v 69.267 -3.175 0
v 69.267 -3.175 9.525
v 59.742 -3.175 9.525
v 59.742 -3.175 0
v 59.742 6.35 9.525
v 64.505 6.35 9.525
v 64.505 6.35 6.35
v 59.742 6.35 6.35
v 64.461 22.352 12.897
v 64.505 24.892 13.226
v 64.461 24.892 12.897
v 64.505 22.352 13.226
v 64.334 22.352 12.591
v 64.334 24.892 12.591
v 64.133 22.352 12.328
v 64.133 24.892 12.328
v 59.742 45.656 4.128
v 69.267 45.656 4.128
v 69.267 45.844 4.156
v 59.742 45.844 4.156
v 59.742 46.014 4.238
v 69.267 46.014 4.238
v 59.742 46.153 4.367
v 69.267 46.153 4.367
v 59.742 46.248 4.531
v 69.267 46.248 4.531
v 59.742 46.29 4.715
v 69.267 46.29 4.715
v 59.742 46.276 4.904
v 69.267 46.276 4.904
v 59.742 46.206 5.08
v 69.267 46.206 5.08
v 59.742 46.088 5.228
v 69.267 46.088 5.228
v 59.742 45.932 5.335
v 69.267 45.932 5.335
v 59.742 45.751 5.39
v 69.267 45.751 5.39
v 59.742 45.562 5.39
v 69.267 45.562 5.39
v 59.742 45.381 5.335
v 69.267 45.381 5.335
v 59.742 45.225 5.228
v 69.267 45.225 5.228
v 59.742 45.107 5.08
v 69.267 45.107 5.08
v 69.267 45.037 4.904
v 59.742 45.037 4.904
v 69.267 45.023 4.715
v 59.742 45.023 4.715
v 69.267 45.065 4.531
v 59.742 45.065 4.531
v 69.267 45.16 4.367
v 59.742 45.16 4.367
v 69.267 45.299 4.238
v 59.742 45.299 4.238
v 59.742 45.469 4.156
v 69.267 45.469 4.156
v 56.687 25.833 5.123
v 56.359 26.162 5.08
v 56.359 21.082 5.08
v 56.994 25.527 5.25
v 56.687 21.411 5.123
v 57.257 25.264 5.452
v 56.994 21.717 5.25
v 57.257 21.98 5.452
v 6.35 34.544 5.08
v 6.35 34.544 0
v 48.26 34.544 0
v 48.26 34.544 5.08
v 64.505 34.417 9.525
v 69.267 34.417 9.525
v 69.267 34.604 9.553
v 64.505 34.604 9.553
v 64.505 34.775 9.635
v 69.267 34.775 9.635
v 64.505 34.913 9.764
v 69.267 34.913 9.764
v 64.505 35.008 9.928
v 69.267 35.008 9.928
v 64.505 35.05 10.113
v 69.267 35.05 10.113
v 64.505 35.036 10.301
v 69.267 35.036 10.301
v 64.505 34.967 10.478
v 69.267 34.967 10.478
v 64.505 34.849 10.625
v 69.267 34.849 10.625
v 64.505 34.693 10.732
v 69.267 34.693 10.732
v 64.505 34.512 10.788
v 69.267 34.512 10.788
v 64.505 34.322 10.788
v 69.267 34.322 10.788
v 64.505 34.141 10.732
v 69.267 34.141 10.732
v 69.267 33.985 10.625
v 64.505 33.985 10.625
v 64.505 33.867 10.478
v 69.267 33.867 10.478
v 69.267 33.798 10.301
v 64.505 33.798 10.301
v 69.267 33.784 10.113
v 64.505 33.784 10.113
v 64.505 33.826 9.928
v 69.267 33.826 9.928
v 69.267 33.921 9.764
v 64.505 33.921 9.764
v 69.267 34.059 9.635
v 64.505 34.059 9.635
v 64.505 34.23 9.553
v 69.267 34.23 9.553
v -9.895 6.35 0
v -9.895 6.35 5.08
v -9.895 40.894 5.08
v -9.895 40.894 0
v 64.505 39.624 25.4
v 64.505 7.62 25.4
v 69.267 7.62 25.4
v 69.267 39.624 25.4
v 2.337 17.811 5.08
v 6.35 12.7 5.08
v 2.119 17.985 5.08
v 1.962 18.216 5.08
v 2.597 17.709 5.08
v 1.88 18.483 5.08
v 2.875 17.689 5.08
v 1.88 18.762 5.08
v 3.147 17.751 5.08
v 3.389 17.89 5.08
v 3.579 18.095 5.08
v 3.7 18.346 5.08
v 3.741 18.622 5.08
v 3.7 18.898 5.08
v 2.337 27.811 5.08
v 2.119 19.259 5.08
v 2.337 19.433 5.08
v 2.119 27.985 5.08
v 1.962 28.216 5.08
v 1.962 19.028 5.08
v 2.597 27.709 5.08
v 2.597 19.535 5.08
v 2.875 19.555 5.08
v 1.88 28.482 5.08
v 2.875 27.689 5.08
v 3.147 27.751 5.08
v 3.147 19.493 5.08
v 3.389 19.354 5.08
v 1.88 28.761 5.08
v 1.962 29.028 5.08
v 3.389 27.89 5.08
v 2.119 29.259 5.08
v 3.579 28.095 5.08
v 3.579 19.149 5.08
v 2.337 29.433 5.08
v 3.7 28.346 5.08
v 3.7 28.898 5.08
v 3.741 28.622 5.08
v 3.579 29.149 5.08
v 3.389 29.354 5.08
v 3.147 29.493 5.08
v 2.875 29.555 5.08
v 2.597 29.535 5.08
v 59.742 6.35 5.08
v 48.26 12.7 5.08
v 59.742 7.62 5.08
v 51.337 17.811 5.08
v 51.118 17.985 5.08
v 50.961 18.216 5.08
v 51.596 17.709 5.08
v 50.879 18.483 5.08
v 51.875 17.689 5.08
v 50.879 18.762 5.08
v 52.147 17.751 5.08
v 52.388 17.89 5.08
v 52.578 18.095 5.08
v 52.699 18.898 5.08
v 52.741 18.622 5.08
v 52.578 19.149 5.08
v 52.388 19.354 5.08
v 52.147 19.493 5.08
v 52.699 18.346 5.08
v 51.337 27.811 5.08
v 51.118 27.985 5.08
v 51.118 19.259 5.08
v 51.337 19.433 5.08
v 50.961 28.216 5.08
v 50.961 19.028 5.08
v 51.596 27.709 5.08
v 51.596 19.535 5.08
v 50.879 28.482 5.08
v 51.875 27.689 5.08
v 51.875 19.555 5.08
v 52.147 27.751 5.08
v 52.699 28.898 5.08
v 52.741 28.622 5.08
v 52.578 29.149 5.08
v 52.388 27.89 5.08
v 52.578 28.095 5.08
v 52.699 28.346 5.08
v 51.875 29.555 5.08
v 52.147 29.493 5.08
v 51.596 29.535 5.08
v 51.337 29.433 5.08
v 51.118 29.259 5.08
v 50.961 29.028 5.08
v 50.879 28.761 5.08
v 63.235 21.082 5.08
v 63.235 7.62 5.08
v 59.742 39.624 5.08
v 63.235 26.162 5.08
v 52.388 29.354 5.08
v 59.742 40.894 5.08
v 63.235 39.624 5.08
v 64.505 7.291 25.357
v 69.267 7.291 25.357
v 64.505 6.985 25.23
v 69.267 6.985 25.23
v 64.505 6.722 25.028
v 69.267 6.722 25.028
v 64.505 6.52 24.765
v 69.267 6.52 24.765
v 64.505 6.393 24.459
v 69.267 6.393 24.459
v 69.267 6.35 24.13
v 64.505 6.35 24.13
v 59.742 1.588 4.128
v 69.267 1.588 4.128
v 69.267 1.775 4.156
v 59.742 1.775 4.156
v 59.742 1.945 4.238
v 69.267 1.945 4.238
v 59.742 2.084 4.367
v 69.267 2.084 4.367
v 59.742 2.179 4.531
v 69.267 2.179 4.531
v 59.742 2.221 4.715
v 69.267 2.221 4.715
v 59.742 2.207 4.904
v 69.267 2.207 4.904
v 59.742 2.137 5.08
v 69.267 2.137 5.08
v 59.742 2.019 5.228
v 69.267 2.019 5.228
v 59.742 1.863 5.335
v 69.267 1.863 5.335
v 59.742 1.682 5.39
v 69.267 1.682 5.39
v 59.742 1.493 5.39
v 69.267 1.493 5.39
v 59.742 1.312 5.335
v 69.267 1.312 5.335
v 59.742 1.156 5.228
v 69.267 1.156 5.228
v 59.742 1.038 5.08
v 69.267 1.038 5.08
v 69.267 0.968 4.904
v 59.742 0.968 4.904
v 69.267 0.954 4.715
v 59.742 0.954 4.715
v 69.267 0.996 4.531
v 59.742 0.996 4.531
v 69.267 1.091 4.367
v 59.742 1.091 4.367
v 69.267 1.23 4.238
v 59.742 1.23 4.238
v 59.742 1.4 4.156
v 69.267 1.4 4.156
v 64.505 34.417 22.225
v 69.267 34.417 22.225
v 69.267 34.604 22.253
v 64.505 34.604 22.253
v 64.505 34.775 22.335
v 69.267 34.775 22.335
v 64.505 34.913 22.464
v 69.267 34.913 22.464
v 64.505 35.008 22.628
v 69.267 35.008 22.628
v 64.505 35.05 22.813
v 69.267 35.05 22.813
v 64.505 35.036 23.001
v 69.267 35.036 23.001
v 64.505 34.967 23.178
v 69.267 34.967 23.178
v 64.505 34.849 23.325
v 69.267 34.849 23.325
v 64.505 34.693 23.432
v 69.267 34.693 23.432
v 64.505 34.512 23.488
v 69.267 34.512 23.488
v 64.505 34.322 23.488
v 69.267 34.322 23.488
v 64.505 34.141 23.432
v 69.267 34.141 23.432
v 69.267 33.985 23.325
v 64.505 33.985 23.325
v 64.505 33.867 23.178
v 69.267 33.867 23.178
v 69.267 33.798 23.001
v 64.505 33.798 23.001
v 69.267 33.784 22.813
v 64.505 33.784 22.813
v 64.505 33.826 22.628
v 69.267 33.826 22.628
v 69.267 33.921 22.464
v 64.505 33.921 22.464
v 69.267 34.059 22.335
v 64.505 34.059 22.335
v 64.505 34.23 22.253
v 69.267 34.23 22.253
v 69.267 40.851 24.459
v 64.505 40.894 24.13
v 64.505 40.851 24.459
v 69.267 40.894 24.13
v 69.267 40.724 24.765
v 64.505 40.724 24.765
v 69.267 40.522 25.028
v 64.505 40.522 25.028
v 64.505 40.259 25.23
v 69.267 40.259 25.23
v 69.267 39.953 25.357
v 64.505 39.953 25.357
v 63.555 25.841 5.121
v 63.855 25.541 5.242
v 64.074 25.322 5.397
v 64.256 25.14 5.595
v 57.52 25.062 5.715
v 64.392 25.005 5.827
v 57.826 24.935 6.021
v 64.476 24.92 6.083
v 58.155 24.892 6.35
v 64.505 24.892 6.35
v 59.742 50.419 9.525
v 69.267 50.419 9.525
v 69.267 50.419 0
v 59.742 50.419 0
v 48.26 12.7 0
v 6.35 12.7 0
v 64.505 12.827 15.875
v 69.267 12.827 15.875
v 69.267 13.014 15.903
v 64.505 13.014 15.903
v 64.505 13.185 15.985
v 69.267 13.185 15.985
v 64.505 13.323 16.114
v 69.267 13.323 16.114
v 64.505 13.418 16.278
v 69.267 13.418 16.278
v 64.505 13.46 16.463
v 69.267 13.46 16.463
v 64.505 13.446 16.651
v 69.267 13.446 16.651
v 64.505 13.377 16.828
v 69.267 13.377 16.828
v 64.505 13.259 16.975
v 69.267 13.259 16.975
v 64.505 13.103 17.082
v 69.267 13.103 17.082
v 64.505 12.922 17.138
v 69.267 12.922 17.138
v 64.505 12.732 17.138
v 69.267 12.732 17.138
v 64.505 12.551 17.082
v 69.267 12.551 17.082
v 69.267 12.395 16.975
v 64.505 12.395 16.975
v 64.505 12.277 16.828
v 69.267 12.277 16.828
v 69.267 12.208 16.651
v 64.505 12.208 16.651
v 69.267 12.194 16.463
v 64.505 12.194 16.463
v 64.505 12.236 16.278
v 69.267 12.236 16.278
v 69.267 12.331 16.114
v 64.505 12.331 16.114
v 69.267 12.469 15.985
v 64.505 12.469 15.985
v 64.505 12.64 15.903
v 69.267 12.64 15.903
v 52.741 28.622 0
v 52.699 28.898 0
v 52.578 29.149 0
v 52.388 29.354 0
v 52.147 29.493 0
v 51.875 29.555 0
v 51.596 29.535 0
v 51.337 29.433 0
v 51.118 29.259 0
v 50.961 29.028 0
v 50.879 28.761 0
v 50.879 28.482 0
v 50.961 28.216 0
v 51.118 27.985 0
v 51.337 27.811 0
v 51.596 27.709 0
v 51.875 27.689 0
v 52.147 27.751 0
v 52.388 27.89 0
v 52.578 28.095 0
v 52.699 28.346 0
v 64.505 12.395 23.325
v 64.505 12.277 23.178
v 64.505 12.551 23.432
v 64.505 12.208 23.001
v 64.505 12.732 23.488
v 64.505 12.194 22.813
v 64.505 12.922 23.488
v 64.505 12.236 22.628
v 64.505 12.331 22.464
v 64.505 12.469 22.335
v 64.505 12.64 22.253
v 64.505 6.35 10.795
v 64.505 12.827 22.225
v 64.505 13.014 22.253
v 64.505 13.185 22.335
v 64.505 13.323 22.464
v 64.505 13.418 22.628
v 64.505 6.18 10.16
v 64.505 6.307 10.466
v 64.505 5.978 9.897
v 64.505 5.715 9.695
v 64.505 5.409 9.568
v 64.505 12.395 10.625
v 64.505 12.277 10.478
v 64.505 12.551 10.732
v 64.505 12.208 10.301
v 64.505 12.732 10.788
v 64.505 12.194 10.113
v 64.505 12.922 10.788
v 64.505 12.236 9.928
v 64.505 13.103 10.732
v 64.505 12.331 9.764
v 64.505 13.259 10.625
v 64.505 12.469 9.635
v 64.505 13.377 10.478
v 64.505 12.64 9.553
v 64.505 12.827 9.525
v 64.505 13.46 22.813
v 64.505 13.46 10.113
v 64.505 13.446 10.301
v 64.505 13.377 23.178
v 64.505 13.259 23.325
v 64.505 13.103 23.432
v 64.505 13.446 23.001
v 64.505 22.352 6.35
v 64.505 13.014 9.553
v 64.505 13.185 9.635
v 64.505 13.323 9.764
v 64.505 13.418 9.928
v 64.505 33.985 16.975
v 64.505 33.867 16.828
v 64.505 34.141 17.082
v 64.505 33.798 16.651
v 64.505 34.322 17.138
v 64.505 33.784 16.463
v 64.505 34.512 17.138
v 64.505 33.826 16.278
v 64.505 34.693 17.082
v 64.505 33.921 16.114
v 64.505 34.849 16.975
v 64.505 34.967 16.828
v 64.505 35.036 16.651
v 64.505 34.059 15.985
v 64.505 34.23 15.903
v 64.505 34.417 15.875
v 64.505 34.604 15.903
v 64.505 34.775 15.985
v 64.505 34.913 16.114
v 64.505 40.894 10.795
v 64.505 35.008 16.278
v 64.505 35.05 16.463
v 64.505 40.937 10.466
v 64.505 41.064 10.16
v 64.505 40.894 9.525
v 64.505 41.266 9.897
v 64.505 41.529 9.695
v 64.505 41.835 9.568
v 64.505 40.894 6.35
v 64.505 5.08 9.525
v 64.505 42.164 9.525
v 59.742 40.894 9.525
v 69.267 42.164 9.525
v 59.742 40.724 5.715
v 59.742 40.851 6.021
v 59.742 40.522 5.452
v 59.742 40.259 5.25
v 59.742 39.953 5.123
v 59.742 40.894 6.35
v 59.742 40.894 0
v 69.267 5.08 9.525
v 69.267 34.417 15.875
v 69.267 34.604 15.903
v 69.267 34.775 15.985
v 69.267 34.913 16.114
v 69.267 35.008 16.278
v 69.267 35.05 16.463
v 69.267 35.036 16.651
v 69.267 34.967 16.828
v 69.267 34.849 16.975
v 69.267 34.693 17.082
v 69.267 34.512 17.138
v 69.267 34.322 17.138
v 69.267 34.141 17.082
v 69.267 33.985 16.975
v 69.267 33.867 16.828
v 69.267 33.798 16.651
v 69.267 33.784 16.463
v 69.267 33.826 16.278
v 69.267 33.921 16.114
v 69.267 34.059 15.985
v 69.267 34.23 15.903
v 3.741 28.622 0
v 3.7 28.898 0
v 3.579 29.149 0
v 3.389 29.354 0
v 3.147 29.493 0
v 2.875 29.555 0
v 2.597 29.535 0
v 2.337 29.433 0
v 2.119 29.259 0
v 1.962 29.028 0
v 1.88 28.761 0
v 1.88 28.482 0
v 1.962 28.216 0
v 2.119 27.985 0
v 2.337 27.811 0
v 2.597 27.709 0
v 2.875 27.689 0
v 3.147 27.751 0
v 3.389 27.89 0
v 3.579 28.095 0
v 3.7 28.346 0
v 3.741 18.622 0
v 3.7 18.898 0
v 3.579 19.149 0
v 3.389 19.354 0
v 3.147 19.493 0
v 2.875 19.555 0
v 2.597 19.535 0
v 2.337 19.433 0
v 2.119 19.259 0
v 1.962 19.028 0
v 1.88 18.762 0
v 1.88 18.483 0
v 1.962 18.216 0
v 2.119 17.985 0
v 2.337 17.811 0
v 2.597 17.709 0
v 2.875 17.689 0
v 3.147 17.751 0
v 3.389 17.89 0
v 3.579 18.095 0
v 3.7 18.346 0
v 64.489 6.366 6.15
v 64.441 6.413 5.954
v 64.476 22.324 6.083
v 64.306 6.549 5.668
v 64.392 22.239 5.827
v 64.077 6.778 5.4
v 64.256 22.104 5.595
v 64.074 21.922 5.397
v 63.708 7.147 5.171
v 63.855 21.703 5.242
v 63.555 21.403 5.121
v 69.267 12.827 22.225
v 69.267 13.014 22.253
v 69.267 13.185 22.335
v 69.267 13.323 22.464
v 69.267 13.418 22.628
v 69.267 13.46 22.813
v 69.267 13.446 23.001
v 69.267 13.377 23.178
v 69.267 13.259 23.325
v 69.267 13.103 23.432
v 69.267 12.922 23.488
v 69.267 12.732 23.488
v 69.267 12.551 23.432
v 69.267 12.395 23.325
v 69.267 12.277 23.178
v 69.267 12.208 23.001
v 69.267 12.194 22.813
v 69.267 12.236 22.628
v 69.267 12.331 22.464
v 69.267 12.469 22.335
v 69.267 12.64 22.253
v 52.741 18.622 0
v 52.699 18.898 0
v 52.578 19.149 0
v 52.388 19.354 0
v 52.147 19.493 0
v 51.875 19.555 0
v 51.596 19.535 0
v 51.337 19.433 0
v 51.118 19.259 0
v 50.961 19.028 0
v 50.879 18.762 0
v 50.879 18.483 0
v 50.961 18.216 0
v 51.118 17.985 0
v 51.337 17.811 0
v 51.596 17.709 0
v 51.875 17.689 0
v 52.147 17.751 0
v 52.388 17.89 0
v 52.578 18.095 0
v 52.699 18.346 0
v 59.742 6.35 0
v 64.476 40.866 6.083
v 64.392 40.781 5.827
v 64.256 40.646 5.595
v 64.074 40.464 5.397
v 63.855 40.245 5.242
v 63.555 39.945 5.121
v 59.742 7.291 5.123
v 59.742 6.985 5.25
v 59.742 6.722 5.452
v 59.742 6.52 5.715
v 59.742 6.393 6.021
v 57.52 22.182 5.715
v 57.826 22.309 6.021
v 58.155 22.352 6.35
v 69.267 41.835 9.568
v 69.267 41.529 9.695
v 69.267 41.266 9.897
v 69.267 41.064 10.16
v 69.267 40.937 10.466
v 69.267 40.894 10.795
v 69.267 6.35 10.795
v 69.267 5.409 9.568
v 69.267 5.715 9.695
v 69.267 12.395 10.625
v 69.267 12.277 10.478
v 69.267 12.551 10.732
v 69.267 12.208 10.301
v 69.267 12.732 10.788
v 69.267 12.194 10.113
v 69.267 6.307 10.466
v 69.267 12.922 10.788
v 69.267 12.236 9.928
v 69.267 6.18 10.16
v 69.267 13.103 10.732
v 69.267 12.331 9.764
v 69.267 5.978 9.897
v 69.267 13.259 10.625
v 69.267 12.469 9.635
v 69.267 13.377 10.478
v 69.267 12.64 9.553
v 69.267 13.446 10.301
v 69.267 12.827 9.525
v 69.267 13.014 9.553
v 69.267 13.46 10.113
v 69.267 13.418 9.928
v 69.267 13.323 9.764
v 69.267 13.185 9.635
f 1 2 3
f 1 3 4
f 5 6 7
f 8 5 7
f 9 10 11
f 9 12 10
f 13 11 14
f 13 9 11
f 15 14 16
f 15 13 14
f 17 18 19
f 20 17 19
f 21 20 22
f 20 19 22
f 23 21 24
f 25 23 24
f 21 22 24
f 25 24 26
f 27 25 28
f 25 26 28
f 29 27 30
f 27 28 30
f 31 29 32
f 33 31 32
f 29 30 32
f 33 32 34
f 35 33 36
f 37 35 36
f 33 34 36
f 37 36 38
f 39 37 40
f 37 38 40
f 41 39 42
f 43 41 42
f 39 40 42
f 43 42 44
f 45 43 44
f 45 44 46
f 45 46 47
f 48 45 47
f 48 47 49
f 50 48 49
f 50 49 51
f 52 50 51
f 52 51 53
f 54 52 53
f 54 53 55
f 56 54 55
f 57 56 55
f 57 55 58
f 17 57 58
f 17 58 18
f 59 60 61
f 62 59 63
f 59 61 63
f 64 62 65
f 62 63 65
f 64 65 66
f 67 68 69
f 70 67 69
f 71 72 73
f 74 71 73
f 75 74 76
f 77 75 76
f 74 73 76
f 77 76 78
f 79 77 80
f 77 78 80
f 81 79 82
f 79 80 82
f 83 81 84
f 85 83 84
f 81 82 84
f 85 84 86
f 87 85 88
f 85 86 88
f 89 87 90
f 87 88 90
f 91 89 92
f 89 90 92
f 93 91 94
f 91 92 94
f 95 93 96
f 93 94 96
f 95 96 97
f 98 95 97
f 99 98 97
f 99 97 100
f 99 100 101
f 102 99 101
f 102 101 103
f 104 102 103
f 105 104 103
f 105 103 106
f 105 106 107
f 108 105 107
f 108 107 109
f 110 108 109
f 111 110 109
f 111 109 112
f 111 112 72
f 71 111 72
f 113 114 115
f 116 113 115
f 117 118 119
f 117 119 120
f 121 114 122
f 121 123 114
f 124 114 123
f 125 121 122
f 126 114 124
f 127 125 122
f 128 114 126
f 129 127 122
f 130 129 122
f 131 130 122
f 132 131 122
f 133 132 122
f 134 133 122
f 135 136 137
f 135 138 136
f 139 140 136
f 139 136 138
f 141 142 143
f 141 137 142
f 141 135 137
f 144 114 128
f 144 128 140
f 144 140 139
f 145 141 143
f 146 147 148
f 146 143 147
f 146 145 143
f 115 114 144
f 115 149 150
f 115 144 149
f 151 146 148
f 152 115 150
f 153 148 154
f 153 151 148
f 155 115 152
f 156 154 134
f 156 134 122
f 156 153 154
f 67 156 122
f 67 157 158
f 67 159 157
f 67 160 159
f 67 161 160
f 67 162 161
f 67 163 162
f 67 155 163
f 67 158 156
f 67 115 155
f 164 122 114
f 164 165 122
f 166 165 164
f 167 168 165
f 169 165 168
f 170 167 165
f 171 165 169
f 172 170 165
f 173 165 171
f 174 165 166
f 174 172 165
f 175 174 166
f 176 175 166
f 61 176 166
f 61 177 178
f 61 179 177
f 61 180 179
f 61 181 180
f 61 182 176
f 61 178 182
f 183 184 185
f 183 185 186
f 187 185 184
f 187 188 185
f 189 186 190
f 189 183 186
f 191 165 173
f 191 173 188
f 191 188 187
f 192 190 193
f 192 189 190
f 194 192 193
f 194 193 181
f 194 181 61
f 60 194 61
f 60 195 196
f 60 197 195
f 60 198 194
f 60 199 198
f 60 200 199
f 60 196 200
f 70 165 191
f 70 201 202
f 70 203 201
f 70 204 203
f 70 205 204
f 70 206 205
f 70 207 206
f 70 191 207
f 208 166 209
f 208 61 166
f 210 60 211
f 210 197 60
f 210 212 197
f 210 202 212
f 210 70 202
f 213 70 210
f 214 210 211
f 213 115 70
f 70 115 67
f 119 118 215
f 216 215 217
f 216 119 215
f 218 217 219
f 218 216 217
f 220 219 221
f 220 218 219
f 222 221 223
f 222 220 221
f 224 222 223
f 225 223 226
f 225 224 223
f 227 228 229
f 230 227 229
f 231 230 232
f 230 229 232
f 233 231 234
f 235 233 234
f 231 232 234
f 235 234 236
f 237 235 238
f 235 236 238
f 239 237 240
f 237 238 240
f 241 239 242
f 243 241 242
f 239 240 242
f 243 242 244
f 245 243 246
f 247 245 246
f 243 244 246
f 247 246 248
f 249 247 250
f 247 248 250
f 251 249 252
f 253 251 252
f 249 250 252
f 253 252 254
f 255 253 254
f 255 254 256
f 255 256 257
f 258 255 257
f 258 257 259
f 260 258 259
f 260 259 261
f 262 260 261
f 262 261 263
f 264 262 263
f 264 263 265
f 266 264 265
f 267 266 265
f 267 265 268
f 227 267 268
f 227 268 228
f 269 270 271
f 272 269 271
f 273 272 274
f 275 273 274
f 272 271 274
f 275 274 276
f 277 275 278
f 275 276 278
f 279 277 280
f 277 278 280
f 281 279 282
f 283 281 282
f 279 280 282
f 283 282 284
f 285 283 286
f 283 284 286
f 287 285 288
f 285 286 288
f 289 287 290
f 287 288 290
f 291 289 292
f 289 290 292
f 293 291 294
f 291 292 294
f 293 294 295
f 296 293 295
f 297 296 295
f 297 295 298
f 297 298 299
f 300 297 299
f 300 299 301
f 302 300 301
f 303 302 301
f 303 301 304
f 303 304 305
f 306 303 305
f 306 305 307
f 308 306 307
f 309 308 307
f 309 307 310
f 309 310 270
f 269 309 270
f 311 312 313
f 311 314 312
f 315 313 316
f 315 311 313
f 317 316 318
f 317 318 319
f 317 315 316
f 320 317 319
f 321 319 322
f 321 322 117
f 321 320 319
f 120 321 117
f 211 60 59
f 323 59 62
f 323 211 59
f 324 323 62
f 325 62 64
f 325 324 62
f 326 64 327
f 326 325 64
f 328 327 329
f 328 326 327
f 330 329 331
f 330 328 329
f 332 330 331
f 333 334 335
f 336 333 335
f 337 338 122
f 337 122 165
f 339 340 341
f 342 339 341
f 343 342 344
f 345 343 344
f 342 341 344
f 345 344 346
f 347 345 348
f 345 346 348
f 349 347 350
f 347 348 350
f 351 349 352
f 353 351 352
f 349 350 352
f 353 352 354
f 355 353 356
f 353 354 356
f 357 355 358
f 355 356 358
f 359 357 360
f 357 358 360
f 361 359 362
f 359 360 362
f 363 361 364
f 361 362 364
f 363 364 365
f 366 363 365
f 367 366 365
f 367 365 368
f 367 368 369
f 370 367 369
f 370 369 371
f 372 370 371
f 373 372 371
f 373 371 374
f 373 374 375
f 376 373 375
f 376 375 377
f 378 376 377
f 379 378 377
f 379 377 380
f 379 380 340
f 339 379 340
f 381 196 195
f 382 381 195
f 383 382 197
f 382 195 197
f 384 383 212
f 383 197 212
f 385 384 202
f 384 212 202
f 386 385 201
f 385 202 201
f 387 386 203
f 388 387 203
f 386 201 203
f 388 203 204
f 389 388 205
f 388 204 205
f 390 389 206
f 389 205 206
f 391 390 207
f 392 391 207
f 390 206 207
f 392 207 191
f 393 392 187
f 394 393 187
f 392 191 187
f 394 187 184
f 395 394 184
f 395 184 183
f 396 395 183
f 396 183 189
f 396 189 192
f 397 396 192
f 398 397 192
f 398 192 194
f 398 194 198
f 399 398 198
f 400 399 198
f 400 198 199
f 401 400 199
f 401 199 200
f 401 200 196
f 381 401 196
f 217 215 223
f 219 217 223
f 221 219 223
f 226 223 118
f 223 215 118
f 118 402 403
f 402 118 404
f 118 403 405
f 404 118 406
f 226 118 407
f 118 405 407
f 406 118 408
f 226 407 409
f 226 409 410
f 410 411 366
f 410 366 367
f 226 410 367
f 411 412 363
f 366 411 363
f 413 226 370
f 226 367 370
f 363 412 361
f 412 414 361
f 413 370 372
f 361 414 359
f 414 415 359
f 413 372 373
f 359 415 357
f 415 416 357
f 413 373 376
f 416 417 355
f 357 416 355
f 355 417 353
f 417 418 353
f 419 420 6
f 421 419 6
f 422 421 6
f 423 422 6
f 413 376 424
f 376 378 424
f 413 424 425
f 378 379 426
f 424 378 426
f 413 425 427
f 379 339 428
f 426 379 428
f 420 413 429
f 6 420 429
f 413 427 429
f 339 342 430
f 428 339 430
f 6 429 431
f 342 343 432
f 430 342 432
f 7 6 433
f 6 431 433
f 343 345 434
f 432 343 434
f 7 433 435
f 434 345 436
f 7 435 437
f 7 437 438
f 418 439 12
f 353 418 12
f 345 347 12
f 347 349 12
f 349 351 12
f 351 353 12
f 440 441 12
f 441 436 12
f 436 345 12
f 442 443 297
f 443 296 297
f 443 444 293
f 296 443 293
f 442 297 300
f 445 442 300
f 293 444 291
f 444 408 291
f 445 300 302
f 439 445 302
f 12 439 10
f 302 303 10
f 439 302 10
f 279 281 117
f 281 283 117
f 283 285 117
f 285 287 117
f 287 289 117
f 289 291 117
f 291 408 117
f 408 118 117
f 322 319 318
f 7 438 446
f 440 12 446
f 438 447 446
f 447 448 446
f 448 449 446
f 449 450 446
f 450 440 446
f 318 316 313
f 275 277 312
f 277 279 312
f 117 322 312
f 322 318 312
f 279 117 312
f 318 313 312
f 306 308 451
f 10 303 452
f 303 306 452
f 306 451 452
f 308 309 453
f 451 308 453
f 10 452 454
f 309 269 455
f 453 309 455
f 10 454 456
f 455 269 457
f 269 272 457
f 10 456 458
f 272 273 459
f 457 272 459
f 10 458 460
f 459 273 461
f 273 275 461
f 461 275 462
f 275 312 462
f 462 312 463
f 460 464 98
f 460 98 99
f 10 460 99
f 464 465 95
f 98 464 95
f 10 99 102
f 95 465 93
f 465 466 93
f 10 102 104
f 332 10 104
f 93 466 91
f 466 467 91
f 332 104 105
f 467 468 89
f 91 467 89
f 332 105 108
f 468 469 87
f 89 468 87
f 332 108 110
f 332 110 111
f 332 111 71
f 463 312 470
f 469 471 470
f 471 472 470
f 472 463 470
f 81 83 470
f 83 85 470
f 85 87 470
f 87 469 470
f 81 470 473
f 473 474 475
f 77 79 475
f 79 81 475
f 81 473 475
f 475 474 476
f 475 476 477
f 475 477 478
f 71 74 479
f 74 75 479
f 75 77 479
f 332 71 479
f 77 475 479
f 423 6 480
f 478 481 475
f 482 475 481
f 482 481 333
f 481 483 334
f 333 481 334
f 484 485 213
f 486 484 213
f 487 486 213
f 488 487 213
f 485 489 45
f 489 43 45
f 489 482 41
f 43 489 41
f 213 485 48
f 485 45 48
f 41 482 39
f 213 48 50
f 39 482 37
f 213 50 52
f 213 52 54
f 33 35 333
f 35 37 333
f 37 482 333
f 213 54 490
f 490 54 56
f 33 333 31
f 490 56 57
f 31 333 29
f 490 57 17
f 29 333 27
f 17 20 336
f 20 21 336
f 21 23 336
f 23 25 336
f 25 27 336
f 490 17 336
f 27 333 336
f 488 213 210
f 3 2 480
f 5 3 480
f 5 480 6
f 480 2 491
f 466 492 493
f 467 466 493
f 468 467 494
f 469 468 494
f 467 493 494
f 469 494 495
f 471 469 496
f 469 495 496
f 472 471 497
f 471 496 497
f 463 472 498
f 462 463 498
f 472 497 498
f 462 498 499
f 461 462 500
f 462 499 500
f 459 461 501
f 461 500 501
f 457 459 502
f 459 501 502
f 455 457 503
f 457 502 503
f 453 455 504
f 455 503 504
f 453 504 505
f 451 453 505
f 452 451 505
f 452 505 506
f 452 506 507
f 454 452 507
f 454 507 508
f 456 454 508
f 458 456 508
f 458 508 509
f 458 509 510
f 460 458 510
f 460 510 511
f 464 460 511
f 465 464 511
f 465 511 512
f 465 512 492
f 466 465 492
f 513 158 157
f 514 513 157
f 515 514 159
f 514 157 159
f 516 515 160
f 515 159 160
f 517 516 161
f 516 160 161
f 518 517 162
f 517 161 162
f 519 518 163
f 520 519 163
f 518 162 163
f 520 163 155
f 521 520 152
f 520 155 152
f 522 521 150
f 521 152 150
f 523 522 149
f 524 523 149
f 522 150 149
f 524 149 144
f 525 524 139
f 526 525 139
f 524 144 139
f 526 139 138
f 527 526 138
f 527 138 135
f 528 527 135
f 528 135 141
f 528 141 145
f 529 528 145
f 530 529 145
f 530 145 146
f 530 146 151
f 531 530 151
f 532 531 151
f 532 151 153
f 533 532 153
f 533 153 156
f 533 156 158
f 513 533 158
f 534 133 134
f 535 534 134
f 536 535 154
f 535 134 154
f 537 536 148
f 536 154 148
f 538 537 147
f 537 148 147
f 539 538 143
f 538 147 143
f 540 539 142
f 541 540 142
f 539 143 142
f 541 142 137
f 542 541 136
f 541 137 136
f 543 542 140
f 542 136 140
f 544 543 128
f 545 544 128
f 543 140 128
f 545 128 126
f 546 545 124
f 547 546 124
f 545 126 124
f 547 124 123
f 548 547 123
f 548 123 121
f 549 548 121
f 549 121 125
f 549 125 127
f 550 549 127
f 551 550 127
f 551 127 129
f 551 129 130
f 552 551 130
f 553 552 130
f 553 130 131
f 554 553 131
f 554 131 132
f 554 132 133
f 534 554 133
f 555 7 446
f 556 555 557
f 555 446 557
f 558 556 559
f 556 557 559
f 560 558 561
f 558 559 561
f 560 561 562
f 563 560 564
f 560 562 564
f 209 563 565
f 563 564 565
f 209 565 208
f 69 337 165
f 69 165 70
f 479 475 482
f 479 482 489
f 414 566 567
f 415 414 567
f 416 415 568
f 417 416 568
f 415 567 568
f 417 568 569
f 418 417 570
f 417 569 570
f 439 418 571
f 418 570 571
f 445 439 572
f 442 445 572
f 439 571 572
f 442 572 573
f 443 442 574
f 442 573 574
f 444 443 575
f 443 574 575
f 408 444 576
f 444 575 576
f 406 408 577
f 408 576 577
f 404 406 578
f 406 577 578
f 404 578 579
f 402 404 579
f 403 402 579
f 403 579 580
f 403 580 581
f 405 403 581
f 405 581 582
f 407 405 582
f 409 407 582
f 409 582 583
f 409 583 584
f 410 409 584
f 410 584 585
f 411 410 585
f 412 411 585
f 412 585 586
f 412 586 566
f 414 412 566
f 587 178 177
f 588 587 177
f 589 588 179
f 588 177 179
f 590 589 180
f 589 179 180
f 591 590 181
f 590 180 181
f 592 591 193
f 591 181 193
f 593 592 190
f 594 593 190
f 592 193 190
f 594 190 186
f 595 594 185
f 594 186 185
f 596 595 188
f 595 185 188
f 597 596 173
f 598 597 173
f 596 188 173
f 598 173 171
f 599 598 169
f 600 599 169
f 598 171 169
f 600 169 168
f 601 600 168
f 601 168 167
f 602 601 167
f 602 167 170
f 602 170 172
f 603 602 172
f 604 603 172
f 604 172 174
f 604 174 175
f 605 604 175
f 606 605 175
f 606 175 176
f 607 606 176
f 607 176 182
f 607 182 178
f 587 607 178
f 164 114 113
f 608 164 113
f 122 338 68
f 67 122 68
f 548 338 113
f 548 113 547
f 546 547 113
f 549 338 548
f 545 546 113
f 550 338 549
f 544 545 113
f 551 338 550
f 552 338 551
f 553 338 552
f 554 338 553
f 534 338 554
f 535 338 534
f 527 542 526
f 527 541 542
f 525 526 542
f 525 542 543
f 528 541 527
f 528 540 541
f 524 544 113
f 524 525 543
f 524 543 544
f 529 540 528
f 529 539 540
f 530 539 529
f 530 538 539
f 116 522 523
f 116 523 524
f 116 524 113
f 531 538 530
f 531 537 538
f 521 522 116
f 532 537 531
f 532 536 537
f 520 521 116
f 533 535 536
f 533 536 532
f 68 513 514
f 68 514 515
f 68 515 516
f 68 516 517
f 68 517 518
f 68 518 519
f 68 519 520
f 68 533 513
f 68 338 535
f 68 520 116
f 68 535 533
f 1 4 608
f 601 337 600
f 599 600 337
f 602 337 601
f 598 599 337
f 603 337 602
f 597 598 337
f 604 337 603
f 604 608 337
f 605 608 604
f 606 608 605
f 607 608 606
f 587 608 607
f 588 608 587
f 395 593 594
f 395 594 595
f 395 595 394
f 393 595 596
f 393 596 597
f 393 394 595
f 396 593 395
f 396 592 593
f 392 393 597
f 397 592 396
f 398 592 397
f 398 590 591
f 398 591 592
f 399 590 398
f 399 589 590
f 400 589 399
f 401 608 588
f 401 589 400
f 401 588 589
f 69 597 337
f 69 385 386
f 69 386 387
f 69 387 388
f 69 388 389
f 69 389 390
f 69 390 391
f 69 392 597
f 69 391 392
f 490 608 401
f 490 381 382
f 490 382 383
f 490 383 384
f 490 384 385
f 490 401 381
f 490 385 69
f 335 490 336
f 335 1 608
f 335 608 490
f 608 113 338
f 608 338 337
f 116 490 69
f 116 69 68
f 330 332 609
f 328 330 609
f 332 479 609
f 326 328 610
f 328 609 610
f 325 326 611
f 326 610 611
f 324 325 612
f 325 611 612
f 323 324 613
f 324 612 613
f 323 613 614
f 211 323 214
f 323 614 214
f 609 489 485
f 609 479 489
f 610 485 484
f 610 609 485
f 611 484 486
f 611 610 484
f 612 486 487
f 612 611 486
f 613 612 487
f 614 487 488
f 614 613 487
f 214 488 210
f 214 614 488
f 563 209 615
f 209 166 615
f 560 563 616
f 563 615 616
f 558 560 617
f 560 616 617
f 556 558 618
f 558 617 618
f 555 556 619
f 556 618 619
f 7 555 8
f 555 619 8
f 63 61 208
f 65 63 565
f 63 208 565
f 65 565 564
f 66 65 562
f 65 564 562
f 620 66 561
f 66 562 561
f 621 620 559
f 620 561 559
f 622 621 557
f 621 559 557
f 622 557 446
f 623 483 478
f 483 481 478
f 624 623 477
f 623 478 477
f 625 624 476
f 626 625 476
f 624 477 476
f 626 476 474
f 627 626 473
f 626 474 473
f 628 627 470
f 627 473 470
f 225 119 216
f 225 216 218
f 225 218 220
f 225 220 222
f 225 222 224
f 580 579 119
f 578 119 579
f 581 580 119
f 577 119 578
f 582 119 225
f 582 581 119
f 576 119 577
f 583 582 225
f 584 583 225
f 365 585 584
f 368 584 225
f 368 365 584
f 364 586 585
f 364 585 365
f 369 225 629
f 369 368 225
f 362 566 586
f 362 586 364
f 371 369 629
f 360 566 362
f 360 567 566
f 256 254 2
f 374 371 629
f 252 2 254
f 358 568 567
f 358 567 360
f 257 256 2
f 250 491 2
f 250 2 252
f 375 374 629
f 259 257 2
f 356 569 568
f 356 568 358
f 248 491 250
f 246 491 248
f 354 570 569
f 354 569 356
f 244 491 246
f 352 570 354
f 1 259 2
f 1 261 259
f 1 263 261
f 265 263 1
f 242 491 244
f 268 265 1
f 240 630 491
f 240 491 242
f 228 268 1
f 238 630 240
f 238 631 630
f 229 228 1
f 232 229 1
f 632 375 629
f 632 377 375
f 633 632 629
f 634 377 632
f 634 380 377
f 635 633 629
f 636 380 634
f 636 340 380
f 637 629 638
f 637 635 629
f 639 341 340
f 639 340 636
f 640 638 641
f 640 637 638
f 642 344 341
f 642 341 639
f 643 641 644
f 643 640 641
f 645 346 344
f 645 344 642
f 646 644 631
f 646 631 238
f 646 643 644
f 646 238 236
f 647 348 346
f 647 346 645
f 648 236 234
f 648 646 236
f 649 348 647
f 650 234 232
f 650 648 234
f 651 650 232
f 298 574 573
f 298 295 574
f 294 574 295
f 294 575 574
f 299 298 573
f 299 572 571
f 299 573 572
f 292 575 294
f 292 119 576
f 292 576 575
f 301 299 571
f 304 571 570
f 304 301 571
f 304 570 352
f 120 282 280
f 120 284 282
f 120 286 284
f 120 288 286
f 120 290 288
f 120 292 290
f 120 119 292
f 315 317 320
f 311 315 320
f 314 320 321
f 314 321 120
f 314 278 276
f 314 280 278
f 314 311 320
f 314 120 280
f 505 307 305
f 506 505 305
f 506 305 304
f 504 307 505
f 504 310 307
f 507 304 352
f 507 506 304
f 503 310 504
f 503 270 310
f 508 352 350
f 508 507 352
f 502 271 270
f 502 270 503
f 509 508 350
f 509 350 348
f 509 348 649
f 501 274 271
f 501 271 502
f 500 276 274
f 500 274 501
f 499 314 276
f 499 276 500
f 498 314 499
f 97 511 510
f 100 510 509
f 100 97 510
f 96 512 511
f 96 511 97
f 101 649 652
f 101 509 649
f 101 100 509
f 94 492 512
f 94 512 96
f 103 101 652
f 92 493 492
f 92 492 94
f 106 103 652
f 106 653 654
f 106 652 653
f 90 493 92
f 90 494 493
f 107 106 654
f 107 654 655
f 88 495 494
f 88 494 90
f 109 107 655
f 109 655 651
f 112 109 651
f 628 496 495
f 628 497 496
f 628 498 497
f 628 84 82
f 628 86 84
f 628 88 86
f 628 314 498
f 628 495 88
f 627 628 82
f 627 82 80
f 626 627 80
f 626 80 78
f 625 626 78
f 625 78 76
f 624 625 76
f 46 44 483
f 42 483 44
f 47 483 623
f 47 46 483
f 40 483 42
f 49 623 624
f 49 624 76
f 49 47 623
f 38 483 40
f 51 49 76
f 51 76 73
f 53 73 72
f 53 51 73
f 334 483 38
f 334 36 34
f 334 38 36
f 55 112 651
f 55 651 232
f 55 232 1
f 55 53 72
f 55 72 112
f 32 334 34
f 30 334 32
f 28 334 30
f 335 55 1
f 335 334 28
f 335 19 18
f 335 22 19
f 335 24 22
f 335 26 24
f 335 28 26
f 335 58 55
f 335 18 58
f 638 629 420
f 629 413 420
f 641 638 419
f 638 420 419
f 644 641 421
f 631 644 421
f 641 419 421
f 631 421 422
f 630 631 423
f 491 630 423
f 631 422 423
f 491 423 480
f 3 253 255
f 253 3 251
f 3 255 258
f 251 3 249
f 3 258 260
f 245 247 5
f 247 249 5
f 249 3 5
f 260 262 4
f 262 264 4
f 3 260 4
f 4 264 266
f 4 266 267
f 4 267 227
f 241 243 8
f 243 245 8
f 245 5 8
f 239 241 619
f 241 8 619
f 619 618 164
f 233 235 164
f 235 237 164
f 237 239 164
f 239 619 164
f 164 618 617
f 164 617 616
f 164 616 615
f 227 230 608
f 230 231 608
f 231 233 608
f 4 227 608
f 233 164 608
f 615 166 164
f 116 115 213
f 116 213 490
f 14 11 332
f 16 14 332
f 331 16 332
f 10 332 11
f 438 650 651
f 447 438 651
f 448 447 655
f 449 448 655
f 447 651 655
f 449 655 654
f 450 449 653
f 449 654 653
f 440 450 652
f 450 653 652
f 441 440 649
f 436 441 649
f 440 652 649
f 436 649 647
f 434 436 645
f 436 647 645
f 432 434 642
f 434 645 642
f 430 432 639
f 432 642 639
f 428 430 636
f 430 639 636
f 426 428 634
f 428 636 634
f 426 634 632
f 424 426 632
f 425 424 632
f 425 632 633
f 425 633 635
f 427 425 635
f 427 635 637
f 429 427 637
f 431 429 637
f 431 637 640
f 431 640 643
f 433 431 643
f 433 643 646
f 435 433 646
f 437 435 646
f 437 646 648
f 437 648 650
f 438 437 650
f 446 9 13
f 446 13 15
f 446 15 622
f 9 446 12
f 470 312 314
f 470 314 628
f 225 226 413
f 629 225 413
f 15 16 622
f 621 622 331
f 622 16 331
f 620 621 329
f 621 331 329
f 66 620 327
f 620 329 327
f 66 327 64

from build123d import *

# Parameters (mm, degrees)
SKETCH1_W            = 54.61
SKETCH1_H            = 47.244
SKETCH1_W_2          = 41.91
SKETCH1_H_2          = 21.844
BOSS_EXTRUDE1_DEPTH  = 5.08
SKETCH2_R            = 0.93599
CUT_EXTRUDE1_DEPTH   = 73.388217522
SKETCH10_W           = 14.41958
SKETCH10_H           = 19.49958
SKETCH10_R           = 0.635
BOSS_EXTRUDE4_DEPTH  = 5.08
SKETCH11_R           = 0.635
SKETCH11_W           = 3.302
SKETCH11_H           = 76.2
BOSS_EXTRUDE5_DEPTH  = 5.08
SKETCH12_W           = 60.452
SKETCH12_H           = 6.35
SKETCH12_W_2         = 59.182
CUT_EXTRUDE2_DEPTH   = 95.448366629
SKETCH13_W           = 7.0195552
SKETCH13_H           = 78.993394517
BOSS_EXTRUDE6_DEPTH  = 4.826
FILLET1_R            = 2.54
CUT_EXTRUDE3_DEPTH   = 95.448366629
SKETCH15_W           = 9.078627065
SKETCH15_H           = 34.544
BOSS_EXTRUDE7_DEPTH  = 5.08
SKETCH19_W           = 25.4
SKETCH19_H           = 34.544
BOSS_EXTRUDE9_DEPTH  = 4.7625
SKETCH20_W           = 9.525
SKETCH20_H           = 9.525
BOSS_EXTRUDE10_DEPTH = 9.525
SKETCH21_R           = 0.635
CUT_EXTRUDE4_DEPTH   = 98.23065776
SKETCH22_R           = 0.635
CUT_EXTRUDE5_DEPTH   = 98.23065776
RIB1_REACH           = 80.493
SKETCH24_WALL_W      = 169.76250031
SKETCH24_WALL_H      = 2.54
FILLET2_R            = 1.27


with BuildPart() as part:
    # Sketch1 → Boss-Extrude1 (new body)
    with BuildSketch(Plane.XY):
        with Locations((27.305, 23.622)):
            Rectangle(SKETCH1_W, SKETCH1_H)
        with Locations((27.305, 23.622)):
            Rectangle(SKETCH1_W_2, SKETCH1_H_2, mode=Mode.SUBTRACT)
    extrude(amount=BOSS_EXTRUDE1_DEPTH)

    # Sketch2 → Cut-Extrude1 (cut, through all)
    with BuildSketch(Plane.XY.offset(5.08)):
        with Locations((2.80543, 28.62199)):
            Circle(SKETCH2_R)
        with Locations((2.80543, 18.62201)):
            Circle(SKETCH2_R)
        with Locations((51.80457, 28.62199)):
            Circle(SKETCH2_R)
        with Locations((51.80457, 18.62201)):
            Circle(SKETCH2_R)
    extrude(amount=-CUT_EXTRUDE1_DEPTH, mode=Mode.SUBTRACT)

    # Sketch10 → Boss-Extrude4 (add)
    with BuildSketch(Plane.XY.offset(5.08)):
        with Locations((61.81979, 23.622)):
            Rectangle(SKETCH10_W, SKETCH10_H)
        with Locations((64.35979, 21.49221)):
            Circle(SKETCH10_R, mode=Mode.SUBTRACT)
        with Locations((64.35979, 25.75179)):
            Circle(SKETCH10_R, mode=Mode.SUBTRACT)
    extrude(amount=-BOSS_EXTRUDE4_DEPTH)

    # Sketch11 → Boss-Extrude5 (add)
    with BuildSketch(Plane.XY.offset(5.08)):
        Polygon((0, 47.244), (-5.842, 47.244), (-5.842, 64.262), (-15.748, 64.262), (-15.748, -17.018), (-4.572, -17.018), (-4.572, 0), (0, 0), align=None)
        with Locations(Location((-4.572, 21.49221, 0), (0, 0, 180))):
            Circle(SKETCH11_R, mode=Mode.SUBTRACT)
        with Locations(Location((-4.572, 25.75179, 0), (0, 0, 180))):
            Circle(SKETCH11_R, mode=Mode.SUBTRACT)
        with Locations((-10.795, 23.622)):
            Rectangle(SKETCH11_W, SKETCH11_H, mode=Mode.SUBTRACT)
    extrude(amount=-BOSS_EXTRUDE5_DEPTH)

    # Sketch12 → Cut-Extrude2 (cut, through all)
    with BuildSketch(Plane.XY.offset(5.08)):
        with Locations((24.384, 44.069)):
            Rectangle(SKETCH12_W, SKETCH12_H)
        with Locations((25.019, 3.175)):
            Rectangle(SKETCH12_W_2, SKETCH12_H)
    extrude(amount=-CUT_EXTRUDE2_DEPTH, mode=Mode.SUBTRACT)

    # Sketch13 → Boss-Extrude6 (add)
    with BuildSketch(Plane(origin=(0, 0, 0), x_dir=(-1, 0, 0), z_dir=(0, 0, -1))):
        with Locations((10.665198327, 23.388014827)):
            Rectangle(SKETCH13_W, SKETCH13_H)
    extrude(amount=-BOSS_EXTRUDE6_DEPTH)

    # Fillet1
    fillet1_edges = [part.edges().sort_by_distance(p)[0] for p in [
        (69.02958, 13.87221, 2.54),
        (54.61, 13.87221, 2.54),
        (54.61, 6.35, 2.54),
        (-4.572, 6.35, 2.54),
        (-4.572, -17.018, 2.54),
        (-15.748, -17.018, 2.54),
        (-15.748, 64.262, 2.54),
        (-5.842, 64.262, 2.54),
        (-5.842, 40.894, 2.54),
        (54.61, 40.894, 2.54),
        (54.61, 33.37179, 2.54),
        (69.02958, 33.37179, 2.54),
    ]]
    fillet(fillet1_edges, radius=FILLET1_R)

    # Sketch14 → Cut-Extrude3 (cut, through all)
    with BuildSketch(Plane.XY.offset(5.08)):
        Polygon((2.80543, 40.894), (-0.815942935, 40.894), (-0.815942935, 6.35), (2.80543, 6.35), (2.80543, -19.941776761), (-23.515321153, -19.941776761), (-23.515321153, 65.826532556), (2.80543, 65.826532556), align=None)
        Polygon((51.80457, 40.896870143), (51.80457, 65.826532556), (74.486186006, 65.826532556), (74.486186006, -19.941776761), (51.80457, -19.941776761), (52.07, 6.35), (54.61, 8.89), (54.61, 38.354), align=None)
    extrude(amount=-CUT_EXTRUDE3_DEPTH, mode=Mode.SUBTRACT)

    # Sketch15 → Boss-Extrude7 (add)
    with BuildSketch(Plane.XY.offset(5.08)):
        with Locations((-5.355256468, 23.622)):
            Rectangle(SKETCH15_W, SKETCH15_H)
        Polygon((51.807736495, 40.894), (54.61, 38.354), (54.61, 8.89), (52.07, 6.35), (64.50457, 6.35), (64.50457, 40.894), align=None)
    extrude(amount=-BOSS_EXTRUDE7_DEPTH)

    # Sketch19 → Boss-Extrude9 (add)
    with BuildSketch(Plane(origin=(64.50457, 0, 0), x_dir=(0, 0, -1), z_dir=(1, 0, 0))):
        with Locations((-12.7, 23.622)):
            Rectangle(SKETCH19_W, SKETCH19_H)
    extrude(amount=BOSS_EXTRUDE9_DEPTH)

    # Sketch20 → Boss-Extrude10 (add)
    with BuildSketch(Plane(origin=(69.26707, 0, 0), x_dir=(0, 0, -1), z_dir=(1, 0, 0))):
        with Locations((-4.7625, 45.6565)):
            Rectangle(SKETCH20_W, SKETCH20_H)
        with Locations((-4.7625, 1.5875)):
            Rectangle(SKETCH20_W, SKETCH20_H)
    extrude(amount=-BOSS_EXTRUDE10_DEPTH)

    # Sketch21 → Cut-Extrude4 (cut, through all)
    with BuildSketch(Plane(origin=(69.26707, 0, 0), x_dir=(0, 0, -1), z_dir=(1, 0, 0))):
        with Locations((-4.7625, 45.6565)):
            Circle(SKETCH21_R)
        with Locations((-4.7625, 1.5875)):
            Circle(SKETCH21_R)
    extrude(amount=-CUT_EXTRUDE4_DEPTH, mode=Mode.SUBTRACT)

    # Sketch22 → Cut-Extrude5 (cut, through all)
    with BuildSketch(Plane(origin=(69.26707, 0, 0), x_dir=(0, 0, -1), z_dir=(1, 0, 0))):
        with Locations((-22.86, 34.417)):
            Circle(SKETCH22_R)
        with Locations((-22.86, 12.827)):
            Circle(SKETCH22_R)
        with Locations((-16.51, 34.417)):
            Circle(SKETCH22_R)
        with Locations((-10.16, 34.417)):
            Circle(SKETCH22_R)
        with Locations((-10.16, 12.827)):
            Circle(SKETCH22_R)
        with Locations((-16.51, 12.827)):
            Circle(SKETCH22_R)
    extrude(amount=-CUT_EXTRUDE5_DEPTH, mode=Mode.SUBTRACT)

    # Sketch24 wall → Rib1 (add, up to next)
    with BuildSketch(Plane(origin=(60.69457, 23.622, 8.89), x_dir=(-0.707106781187, 0, -0.707106781187), z_dir=(0.707106781187, 0, -0.707106781187)), mode=Mode.PRIVATE) as rib1_sk1:
        Rectangle(SKETCH24_WALL_W, SKETCH24_WALL_H)
    rib1_tool1 = extrude(rib1_sk1.sketch, amount=RIB1_REACH, mode=Mode.PRIVATE) - part.part
    add(rib1_tool1.solids().sort_by_distance((60.69457, 23.622, 8.89))[0])

    # Fillet2
    fillet2_edges = [part.edges().sort_by_distance(p)[0] for p in [
        (62.12332, 6.35, 5.08),
        (64.50457, 14.351, 5.08),
        (66.88582, 40.894, 25.4),
        (66.88582, 6.35, 25.4),
        (62.12332, 40.894, 5.08),
        (66.88582, 40.894, 9.525),
        (66.88582, 6.35, 9.525),
        (64.50457, 32.893, 5.08),
        (64.50457, 23.622, 12.7),
        (56.88457, 23.622, 5.08),
        (60.69457, 22.352, 5.08),
        (60.69457, 24.892, 5.08),
    ]]
    fillet(fillet2_edges, radius=FILLET2_R)


solid = part.part
